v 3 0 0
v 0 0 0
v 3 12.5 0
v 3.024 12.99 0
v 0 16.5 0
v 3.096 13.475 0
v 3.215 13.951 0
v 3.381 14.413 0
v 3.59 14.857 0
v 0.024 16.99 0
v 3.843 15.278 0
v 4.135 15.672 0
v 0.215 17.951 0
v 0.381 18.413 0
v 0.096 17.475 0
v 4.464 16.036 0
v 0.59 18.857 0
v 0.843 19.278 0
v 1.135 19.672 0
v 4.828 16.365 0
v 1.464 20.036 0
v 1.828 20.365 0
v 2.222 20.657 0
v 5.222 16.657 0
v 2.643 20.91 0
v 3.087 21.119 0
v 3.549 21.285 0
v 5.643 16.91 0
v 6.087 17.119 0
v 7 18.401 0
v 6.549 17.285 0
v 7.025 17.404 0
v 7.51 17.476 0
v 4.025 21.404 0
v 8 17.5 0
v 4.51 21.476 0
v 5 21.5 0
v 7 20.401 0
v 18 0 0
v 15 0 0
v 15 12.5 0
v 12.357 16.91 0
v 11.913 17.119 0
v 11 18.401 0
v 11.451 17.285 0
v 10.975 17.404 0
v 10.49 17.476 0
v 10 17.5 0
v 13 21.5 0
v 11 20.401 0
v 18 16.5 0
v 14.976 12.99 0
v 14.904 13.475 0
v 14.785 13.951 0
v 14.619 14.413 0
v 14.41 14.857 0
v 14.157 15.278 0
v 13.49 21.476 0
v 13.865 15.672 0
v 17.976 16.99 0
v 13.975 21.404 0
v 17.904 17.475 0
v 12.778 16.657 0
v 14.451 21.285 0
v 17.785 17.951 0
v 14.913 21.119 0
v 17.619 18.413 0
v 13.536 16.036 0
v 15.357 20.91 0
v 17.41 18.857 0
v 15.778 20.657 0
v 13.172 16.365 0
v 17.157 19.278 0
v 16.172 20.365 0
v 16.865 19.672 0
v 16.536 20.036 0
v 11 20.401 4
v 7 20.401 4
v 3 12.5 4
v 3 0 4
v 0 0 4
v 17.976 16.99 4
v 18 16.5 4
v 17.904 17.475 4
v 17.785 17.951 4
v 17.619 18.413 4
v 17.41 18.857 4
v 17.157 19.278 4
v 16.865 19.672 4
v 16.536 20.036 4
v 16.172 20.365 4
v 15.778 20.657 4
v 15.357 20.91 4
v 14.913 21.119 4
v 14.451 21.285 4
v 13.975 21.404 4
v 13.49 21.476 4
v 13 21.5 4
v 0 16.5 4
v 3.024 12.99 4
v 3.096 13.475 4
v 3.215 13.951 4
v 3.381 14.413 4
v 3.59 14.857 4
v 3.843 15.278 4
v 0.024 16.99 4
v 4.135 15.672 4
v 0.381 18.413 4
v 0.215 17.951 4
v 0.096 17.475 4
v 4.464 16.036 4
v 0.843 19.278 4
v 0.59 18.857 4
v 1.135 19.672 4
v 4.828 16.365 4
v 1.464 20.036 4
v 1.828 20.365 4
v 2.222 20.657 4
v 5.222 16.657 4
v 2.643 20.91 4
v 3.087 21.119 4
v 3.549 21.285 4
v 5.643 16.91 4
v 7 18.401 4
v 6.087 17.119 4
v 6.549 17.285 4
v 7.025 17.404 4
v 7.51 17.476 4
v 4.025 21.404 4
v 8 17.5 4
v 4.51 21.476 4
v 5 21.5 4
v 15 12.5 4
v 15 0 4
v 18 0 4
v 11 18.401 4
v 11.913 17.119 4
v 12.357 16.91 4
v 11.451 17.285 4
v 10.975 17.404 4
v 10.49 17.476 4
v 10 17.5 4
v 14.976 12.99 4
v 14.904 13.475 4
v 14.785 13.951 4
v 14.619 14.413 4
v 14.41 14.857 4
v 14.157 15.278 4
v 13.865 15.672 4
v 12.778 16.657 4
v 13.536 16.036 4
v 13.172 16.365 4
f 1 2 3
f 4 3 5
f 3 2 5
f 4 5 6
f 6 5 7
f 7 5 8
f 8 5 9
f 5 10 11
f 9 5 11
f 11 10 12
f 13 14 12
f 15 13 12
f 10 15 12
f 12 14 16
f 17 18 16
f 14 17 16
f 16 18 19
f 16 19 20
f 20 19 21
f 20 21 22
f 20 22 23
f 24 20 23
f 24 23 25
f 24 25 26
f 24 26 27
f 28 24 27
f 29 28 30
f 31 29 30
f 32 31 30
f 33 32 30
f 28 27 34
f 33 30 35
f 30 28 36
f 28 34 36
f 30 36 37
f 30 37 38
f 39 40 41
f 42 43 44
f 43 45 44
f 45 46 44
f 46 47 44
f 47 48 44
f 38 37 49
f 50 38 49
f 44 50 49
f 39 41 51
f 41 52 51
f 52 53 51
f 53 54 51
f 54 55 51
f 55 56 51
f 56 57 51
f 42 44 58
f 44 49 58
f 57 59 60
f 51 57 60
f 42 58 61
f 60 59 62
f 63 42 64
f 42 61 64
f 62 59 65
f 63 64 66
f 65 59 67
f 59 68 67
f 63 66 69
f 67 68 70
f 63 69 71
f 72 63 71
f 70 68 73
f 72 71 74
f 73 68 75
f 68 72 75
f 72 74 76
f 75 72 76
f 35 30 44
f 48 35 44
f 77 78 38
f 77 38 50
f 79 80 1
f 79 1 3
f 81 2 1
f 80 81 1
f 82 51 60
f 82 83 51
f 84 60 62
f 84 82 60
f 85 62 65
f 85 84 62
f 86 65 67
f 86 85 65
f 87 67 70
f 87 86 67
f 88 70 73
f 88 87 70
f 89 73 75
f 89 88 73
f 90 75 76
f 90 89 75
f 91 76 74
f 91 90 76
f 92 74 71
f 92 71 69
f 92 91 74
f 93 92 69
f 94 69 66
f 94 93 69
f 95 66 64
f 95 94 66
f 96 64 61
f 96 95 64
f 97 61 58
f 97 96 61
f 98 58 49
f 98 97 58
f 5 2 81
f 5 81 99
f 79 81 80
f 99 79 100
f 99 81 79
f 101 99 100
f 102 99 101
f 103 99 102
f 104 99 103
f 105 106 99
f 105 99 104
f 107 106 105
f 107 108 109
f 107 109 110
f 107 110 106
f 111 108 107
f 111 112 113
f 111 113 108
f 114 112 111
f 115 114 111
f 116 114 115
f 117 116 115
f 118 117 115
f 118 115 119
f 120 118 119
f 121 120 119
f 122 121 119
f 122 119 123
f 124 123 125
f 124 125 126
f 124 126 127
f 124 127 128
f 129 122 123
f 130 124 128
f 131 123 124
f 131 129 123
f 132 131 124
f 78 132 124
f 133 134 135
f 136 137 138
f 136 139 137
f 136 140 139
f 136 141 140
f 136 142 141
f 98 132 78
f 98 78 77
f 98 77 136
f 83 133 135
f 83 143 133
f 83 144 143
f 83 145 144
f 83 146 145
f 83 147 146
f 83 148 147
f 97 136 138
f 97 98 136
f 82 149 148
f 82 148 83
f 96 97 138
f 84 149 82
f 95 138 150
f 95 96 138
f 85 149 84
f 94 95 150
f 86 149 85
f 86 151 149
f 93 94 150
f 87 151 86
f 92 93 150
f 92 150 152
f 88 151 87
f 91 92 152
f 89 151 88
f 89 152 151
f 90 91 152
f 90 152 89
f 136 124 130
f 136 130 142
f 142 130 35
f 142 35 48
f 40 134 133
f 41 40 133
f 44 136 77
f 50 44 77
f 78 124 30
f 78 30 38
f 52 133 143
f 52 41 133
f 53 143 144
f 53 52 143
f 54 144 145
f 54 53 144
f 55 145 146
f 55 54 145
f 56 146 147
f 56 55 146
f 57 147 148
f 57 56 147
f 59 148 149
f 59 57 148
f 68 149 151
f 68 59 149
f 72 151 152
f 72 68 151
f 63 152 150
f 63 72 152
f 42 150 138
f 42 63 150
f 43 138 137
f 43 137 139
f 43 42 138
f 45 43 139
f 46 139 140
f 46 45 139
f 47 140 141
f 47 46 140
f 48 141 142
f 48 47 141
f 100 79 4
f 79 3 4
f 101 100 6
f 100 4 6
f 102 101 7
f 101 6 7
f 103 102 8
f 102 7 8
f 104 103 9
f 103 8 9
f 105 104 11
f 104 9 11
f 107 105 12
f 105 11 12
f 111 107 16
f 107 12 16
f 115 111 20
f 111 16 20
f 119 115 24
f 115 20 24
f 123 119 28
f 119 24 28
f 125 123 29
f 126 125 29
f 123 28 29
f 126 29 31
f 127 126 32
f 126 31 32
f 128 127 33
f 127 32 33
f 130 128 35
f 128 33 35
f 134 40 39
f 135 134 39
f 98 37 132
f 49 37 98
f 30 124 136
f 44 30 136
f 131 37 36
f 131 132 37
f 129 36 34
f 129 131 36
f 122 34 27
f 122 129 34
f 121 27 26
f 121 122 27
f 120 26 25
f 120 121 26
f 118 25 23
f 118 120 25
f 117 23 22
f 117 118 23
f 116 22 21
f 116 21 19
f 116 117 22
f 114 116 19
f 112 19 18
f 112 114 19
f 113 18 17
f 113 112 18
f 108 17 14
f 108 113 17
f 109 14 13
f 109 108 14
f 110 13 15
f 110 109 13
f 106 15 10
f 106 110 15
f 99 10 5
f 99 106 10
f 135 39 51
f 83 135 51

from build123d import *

# Parameters (mm, degrees)
SKETCH_2_W          = 18
SKETCH_2_H          = 21.5
EXTRUDE_1_DEPTH     = 4
SKETCH_3_W          = 12
SKETCH_3_H          = 17.5
CUT_EXTRUDE_1_DEPTH = 29.324018077
FILLET_1_R          = 5
FILLET_2_R          = 5
SKETCH_4_W          = 4
SKETCH_4_H          = 2
CUT_EXTRUDE_2_DEPTH = 29.324018077


with BuildPart() as part:
    # ｽｹｯﾁ2 → ﾎﾞｽ - 押し出し1 (new body)
    with BuildSketch(Plane.XY):
        with Locations((9, 10.75)):
            Rectangle(SKETCH_2_W, SKETCH_2_H)
    extrude(amount=EXTRUDE_1_DEPTH)

    # ｽｹｯﾁ3 → ｶｯﾄ - 押し出し1 (cut, through all)
    with BuildSketch(Plane.XY.offset(4)):
        with Locations((9, 8.75)):
            Rectangle(SKETCH_3_W, SKETCH_3_H)
    extrude(amount=-CUT_EXTRUDE_1_DEPTH, mode=Mode.SUBTRACT)

    # ﾌｨﾚｯﾄ1
    fillet_1_edges = [part.edges().sort_by_distance(p)[0] for p in [
        (3, 17.5, 2),
        (15, 17.5, 2),
    ]]
    fillet(fillet_1_edges, radius=FILLET_1_R)

    # ﾌｨﾚｯﾄ2
    fillet_2_edges = [part.edges().sort_by_distance(p)[0] for p in [
        (0, 21.5, 2),
        (18, 21.5, 2),
    ]]
    fillet(fillet_2_edges, radius=FILLET_2_R)

    # ｽｹｯﾁ4 → ｶｯﾄ - 押し出し2 (cut, through all)
    with BuildSketch(Plane.XY.offset(4)):
        with Locations((9, 19.400947982)):
            Rectangle(SKETCH_4_W, SKETCH_4_H)
    extrude(amount=-CUT_EXTRUDE_2_DEPTH, mode=Mode.SUBTRACT)


solid = part.part
